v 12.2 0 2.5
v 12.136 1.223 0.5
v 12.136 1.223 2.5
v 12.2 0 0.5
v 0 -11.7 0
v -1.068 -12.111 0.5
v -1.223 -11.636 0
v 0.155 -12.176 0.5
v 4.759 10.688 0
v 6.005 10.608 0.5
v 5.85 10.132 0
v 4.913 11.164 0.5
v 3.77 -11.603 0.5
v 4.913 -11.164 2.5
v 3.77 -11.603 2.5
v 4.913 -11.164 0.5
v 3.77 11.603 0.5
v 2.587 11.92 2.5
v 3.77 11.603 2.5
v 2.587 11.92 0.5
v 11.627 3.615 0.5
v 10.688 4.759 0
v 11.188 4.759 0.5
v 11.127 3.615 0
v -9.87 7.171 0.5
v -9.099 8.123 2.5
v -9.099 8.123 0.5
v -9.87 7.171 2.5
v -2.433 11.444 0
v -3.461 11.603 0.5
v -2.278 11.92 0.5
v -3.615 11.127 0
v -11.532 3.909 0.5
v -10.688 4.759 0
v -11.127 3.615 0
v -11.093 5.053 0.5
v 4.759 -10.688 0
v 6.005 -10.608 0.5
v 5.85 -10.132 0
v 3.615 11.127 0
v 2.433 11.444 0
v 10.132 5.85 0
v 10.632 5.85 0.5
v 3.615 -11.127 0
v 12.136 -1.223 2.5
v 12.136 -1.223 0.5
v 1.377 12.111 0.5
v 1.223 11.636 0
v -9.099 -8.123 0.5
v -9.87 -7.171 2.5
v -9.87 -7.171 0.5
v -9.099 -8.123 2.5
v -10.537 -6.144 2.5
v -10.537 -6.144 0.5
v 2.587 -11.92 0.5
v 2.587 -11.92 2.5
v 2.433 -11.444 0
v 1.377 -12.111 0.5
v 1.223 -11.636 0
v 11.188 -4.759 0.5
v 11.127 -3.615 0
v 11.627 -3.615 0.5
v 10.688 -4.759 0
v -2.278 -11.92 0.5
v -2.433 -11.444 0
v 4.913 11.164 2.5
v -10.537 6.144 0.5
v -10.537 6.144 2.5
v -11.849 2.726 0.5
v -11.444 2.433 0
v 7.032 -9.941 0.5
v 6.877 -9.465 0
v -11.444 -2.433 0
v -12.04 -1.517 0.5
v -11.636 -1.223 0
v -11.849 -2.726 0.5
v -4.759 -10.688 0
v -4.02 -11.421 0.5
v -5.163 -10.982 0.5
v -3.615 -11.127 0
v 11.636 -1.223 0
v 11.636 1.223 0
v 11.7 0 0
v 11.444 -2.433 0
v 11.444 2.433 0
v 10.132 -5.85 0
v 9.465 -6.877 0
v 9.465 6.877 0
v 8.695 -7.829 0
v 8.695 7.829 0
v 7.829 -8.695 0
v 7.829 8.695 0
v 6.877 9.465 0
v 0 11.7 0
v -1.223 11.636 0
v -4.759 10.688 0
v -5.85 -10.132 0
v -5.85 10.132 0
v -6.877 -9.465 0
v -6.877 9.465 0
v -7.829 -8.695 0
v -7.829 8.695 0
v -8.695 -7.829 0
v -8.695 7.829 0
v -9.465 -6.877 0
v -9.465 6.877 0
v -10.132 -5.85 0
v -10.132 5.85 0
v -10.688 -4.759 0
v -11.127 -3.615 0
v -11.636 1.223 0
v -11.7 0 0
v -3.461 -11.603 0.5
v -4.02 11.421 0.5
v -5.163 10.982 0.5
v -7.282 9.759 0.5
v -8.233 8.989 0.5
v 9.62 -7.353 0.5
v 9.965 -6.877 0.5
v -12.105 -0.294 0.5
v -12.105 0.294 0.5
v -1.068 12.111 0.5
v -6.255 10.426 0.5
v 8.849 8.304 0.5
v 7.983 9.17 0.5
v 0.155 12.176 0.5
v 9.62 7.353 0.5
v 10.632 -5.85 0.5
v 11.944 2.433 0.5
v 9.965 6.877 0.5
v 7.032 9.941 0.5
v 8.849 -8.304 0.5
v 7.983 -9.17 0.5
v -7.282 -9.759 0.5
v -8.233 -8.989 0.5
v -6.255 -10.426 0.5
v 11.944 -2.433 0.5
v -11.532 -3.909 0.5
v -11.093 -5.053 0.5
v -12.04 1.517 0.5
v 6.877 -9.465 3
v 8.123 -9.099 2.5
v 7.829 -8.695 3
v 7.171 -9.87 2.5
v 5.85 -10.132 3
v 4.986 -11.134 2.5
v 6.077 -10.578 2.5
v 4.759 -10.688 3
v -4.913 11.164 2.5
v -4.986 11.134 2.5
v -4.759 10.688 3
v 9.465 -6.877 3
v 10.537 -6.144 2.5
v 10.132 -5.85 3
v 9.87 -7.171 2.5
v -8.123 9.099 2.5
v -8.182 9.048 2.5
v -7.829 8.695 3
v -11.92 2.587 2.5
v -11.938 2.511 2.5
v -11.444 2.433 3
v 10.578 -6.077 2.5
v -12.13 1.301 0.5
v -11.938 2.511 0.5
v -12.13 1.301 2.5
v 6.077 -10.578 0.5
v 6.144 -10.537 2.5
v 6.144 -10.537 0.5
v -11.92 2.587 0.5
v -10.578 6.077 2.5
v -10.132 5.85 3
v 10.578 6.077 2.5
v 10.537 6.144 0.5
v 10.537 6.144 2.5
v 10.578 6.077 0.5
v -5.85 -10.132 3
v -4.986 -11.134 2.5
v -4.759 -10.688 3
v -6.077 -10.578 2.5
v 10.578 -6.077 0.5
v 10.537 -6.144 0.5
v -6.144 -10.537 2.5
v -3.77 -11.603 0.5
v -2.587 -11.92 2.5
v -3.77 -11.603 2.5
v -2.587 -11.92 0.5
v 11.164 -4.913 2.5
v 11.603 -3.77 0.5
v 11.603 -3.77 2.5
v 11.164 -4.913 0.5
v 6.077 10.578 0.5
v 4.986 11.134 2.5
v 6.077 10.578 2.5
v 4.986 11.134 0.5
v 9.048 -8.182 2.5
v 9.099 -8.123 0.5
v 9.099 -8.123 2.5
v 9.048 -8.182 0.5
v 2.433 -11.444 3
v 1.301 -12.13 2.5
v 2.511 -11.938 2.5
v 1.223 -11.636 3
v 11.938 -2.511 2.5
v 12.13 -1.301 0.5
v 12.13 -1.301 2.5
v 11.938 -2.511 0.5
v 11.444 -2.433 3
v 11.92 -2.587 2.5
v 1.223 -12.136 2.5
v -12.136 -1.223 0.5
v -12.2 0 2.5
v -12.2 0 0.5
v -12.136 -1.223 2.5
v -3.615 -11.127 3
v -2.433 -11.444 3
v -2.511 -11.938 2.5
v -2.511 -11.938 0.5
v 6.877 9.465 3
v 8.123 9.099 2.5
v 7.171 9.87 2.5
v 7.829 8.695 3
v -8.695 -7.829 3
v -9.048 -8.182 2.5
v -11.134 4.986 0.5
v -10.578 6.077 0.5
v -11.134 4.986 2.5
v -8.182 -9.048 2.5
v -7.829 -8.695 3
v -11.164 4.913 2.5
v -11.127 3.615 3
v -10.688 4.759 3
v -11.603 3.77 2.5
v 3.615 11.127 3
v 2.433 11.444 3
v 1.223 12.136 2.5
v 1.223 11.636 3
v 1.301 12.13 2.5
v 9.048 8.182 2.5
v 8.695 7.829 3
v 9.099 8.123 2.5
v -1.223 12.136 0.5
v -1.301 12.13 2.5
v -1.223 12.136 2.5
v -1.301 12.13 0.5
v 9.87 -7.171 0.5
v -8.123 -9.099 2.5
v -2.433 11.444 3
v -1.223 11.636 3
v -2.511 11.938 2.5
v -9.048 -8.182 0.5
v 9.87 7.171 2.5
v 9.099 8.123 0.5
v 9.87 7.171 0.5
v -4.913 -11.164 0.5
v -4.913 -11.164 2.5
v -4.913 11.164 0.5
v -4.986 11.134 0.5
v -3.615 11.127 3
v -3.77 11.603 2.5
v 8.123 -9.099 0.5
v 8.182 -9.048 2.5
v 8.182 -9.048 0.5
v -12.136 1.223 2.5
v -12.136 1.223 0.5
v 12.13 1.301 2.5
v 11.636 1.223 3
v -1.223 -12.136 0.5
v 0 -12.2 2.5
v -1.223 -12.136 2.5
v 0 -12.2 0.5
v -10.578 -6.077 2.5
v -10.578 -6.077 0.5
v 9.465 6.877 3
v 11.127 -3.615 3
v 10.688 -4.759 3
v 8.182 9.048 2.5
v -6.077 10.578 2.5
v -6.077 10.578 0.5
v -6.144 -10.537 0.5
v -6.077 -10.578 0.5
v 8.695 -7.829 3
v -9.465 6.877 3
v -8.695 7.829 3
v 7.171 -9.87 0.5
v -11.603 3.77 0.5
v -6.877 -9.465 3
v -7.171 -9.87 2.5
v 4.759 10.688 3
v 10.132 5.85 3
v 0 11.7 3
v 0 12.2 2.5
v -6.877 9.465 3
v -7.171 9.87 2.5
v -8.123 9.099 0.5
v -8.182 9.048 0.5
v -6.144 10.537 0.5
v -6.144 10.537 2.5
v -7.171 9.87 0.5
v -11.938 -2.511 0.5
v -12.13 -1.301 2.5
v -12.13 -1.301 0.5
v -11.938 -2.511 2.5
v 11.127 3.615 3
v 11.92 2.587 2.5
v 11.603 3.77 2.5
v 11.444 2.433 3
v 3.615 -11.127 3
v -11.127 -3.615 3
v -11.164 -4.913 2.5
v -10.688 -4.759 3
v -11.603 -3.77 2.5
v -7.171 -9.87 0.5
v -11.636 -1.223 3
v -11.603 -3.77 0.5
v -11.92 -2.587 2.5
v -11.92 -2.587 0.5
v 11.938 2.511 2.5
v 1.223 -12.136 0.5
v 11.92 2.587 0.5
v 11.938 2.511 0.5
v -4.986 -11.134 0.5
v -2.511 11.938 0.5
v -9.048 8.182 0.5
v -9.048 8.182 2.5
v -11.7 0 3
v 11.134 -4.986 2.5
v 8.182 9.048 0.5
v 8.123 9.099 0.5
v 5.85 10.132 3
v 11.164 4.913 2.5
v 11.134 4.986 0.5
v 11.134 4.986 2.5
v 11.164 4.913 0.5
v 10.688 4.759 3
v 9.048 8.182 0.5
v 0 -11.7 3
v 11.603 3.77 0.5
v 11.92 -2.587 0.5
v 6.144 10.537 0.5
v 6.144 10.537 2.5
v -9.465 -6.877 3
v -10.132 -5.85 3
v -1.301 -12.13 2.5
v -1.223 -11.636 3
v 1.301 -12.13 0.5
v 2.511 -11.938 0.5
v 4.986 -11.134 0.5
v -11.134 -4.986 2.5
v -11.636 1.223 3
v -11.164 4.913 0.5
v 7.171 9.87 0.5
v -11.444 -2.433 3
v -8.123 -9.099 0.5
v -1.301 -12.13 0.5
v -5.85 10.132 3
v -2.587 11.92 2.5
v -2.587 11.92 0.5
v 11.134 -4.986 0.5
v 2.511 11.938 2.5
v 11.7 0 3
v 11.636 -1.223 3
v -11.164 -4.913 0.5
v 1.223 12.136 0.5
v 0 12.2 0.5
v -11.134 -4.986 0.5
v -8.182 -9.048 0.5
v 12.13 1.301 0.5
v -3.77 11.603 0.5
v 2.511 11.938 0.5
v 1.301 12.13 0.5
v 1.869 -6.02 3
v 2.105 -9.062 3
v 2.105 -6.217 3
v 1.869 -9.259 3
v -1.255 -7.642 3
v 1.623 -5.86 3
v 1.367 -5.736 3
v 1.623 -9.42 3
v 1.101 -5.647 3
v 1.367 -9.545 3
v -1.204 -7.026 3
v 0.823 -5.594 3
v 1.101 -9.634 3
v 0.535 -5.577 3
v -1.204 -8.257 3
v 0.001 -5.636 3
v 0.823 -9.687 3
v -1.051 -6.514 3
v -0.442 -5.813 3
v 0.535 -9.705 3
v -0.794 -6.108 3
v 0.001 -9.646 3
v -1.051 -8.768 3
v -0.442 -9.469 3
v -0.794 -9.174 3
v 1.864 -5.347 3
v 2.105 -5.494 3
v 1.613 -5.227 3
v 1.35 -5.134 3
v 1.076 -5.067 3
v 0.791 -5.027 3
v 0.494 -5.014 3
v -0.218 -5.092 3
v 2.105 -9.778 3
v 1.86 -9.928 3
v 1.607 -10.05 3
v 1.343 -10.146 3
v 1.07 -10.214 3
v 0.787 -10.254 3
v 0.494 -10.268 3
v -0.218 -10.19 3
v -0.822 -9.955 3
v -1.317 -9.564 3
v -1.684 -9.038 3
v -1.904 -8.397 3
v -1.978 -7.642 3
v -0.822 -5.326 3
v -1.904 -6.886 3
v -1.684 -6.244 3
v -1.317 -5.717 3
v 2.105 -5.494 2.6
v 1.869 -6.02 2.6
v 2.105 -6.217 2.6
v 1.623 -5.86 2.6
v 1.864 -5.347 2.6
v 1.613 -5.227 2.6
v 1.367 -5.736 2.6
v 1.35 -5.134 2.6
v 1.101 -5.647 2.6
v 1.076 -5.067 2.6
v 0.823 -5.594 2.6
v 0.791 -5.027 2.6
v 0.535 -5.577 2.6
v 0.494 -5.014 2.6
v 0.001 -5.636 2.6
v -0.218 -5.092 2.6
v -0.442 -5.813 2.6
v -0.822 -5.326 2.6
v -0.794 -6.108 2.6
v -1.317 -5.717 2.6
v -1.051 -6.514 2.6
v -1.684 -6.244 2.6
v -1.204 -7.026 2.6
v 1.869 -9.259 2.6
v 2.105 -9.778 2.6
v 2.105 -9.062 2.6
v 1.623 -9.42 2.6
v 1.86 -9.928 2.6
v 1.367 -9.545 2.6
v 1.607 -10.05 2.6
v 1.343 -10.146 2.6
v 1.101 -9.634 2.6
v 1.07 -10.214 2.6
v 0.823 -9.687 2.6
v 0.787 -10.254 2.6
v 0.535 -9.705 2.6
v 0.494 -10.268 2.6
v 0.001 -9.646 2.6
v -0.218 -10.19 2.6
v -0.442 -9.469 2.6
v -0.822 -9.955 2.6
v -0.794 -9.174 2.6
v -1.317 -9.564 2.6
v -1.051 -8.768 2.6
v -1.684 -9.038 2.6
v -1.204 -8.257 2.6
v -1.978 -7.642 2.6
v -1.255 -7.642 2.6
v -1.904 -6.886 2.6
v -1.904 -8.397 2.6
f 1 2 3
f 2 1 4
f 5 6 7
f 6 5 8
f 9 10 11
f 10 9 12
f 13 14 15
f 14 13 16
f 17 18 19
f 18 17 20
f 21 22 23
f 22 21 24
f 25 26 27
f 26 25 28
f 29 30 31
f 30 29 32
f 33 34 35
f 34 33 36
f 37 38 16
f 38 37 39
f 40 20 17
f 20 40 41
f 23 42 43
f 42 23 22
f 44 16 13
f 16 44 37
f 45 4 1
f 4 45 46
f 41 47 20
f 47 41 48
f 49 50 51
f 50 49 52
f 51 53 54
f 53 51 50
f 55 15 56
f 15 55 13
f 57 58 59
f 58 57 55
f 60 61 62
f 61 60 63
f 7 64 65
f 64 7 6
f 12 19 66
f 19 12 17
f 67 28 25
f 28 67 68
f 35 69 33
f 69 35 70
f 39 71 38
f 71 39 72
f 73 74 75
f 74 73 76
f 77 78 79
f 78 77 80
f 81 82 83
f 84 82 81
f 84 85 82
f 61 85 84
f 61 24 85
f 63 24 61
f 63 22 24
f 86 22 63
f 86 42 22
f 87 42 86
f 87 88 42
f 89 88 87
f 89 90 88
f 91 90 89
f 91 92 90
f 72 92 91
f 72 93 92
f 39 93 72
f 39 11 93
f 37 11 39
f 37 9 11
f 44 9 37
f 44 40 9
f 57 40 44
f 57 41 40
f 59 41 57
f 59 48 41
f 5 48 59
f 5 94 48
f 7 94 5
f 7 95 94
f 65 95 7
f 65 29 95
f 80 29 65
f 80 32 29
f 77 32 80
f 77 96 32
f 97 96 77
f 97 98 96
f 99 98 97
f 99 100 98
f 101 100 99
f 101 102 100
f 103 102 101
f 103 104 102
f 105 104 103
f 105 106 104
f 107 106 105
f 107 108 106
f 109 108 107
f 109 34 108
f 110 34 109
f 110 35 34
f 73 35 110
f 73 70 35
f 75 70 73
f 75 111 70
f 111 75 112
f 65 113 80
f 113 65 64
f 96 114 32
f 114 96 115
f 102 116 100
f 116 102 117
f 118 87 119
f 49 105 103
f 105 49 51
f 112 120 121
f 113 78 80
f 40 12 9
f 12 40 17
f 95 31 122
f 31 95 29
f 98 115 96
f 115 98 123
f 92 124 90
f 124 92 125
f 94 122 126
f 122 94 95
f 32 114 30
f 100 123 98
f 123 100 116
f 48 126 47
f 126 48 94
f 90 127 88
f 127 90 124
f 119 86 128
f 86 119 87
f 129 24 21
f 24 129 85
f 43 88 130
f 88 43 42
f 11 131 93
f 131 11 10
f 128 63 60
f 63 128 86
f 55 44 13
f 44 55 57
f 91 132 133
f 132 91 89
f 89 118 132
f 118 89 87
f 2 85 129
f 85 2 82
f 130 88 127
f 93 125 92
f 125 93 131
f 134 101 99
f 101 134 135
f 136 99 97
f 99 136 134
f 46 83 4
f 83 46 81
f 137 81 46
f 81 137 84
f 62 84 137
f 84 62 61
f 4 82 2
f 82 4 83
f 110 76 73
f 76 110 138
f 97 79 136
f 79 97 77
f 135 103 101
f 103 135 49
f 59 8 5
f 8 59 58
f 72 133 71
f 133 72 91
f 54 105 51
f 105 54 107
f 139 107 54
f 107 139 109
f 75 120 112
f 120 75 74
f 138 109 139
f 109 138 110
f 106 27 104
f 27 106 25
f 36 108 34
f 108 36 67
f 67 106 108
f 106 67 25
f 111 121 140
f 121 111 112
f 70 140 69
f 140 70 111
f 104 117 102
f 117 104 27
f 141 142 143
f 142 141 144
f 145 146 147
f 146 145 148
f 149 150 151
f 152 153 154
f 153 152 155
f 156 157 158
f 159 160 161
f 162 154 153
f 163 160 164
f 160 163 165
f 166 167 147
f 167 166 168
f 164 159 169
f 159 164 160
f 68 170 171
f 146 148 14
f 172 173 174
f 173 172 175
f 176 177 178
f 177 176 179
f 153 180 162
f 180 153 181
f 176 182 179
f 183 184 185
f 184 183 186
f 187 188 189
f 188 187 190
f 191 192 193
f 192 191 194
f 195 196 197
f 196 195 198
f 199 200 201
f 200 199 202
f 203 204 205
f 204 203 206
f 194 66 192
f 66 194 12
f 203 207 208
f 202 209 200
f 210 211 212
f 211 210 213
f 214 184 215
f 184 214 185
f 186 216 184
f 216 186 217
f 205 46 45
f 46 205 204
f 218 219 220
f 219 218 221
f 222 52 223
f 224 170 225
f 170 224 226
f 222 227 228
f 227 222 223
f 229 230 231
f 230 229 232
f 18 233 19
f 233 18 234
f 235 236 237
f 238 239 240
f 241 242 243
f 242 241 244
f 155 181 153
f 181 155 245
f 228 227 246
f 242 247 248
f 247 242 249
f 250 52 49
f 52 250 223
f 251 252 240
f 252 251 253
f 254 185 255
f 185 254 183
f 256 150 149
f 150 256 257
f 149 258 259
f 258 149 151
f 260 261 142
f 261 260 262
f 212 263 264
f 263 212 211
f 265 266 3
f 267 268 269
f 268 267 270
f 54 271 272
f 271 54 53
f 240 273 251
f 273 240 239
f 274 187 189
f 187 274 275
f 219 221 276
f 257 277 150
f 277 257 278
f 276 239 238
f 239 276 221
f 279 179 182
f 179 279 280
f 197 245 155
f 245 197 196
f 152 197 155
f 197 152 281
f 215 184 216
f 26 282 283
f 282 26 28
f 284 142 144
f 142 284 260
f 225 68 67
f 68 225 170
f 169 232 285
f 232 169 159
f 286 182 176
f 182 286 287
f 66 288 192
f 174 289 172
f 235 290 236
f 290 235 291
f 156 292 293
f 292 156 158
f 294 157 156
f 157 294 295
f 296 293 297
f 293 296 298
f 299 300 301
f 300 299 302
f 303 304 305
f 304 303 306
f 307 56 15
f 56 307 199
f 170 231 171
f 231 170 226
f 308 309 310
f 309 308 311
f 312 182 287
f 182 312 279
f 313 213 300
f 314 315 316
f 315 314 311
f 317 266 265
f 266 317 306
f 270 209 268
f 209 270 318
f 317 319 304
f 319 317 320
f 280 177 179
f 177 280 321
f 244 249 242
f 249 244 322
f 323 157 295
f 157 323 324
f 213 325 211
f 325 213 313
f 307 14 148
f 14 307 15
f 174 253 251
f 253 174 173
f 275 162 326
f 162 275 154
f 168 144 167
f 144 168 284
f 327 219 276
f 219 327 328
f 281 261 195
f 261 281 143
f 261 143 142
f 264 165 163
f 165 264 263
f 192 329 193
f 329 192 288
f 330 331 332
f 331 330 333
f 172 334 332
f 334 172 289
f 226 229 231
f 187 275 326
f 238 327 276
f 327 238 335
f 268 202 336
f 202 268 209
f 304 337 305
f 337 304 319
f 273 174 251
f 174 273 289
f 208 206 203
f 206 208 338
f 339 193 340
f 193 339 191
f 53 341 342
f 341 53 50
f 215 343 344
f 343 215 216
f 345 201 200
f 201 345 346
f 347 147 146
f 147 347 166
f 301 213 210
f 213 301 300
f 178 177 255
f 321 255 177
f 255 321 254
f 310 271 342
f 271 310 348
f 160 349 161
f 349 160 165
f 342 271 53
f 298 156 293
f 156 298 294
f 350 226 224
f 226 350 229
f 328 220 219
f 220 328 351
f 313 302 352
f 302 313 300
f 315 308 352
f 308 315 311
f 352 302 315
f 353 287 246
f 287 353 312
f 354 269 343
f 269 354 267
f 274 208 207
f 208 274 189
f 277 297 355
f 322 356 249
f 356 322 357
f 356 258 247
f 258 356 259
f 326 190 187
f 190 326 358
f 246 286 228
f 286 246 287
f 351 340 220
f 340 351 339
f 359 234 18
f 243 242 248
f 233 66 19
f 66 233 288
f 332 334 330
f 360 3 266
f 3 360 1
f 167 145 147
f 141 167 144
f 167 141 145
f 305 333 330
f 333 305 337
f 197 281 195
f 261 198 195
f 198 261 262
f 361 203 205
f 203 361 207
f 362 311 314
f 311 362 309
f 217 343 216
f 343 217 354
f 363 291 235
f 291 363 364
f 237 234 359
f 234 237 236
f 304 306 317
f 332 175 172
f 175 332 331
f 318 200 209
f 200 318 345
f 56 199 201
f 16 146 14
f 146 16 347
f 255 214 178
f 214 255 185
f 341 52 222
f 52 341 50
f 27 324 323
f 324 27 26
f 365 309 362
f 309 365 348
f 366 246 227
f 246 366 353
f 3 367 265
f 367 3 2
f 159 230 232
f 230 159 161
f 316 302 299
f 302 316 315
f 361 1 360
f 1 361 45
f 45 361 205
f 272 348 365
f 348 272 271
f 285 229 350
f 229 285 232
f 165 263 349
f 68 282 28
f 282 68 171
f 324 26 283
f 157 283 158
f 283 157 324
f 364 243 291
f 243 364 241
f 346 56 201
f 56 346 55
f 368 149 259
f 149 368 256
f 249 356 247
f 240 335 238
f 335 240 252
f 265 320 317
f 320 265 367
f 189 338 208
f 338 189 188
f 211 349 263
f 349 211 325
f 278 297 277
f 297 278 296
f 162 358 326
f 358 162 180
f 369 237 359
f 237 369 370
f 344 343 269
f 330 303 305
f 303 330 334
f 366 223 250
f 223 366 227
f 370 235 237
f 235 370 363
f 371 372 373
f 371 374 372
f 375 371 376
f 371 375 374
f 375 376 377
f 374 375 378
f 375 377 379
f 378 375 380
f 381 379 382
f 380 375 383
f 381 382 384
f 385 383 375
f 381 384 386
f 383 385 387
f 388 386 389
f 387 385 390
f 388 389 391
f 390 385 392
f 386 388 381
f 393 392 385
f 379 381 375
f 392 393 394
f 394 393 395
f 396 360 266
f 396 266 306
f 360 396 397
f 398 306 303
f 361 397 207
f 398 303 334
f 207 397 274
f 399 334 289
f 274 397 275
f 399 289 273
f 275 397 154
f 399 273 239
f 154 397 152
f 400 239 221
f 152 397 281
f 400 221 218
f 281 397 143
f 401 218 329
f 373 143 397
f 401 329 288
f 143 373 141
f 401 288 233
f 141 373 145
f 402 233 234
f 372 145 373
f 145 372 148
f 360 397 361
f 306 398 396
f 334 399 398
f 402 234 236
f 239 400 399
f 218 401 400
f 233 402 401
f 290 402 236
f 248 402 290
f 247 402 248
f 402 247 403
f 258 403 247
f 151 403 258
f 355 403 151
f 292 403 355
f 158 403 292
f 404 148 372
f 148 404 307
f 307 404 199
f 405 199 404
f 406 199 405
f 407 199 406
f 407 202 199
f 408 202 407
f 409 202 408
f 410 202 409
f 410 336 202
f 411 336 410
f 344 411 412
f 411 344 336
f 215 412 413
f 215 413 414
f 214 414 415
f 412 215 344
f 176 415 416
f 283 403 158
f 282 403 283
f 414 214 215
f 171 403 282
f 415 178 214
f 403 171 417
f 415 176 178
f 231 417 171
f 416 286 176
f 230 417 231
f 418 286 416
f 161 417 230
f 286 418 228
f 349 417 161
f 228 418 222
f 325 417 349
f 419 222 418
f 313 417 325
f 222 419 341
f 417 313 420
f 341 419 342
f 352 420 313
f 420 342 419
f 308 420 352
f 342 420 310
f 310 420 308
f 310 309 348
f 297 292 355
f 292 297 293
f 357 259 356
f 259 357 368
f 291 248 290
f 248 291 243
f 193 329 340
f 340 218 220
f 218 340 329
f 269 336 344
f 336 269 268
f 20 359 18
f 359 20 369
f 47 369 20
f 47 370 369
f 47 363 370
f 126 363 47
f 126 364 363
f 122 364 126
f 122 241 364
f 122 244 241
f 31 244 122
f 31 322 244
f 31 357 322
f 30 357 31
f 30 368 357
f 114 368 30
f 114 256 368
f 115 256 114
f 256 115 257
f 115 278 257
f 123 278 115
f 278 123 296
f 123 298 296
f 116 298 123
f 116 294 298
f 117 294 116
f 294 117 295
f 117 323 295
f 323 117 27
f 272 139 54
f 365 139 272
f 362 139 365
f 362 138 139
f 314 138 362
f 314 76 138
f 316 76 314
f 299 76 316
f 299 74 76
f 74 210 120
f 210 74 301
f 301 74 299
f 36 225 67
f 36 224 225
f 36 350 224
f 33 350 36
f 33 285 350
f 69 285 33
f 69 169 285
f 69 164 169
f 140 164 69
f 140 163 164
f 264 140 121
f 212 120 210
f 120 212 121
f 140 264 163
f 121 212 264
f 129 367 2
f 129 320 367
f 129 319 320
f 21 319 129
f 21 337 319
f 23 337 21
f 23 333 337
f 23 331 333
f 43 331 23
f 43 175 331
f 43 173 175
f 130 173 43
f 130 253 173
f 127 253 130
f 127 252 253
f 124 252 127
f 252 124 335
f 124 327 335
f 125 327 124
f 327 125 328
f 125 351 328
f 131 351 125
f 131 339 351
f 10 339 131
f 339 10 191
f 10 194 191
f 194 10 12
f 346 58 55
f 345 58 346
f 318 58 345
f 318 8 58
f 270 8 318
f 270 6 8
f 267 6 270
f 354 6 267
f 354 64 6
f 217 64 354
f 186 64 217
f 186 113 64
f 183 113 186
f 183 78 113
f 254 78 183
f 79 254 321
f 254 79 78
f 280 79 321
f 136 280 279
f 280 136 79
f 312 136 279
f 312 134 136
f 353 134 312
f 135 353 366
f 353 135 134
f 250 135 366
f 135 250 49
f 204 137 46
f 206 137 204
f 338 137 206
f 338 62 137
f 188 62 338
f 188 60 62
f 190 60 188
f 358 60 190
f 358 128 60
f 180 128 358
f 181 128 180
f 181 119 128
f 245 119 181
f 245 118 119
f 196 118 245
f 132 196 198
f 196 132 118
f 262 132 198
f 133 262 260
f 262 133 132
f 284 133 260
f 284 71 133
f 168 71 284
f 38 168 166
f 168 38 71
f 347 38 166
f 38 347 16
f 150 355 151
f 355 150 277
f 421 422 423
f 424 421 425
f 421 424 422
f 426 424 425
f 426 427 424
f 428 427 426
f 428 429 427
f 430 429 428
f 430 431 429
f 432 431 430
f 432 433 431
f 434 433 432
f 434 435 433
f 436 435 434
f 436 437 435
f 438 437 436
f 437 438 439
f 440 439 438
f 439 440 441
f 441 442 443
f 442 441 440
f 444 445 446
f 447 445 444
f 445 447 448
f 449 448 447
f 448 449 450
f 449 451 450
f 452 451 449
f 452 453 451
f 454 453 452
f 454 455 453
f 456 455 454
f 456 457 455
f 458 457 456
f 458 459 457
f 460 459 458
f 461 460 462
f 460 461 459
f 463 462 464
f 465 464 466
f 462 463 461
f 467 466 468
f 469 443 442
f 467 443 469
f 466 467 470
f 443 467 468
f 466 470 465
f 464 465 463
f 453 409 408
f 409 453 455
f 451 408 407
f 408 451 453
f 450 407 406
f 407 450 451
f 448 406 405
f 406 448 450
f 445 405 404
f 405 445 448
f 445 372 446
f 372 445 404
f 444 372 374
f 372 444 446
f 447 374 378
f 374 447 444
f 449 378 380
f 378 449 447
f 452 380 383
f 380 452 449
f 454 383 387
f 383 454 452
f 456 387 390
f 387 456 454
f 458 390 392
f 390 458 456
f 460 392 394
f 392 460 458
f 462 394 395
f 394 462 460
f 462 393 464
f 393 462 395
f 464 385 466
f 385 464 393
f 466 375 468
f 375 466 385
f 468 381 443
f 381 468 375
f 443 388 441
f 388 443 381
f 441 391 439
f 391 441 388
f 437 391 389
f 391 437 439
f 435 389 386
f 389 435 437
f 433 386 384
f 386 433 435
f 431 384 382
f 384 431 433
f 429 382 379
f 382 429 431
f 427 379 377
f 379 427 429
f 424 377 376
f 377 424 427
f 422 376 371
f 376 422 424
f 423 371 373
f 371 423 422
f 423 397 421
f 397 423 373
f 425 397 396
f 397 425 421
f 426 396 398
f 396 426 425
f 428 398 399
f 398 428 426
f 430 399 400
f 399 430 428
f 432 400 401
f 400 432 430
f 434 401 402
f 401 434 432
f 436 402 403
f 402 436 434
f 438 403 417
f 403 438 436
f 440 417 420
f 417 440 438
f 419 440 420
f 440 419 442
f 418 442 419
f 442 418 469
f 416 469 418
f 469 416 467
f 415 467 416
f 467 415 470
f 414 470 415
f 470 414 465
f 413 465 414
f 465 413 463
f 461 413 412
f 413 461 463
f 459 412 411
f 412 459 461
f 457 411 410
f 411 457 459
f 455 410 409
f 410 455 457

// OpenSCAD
diameter = 25.4;
label = "C";

text_offset_from_edge = 5;
text_depth = 0.4;
text_size = 5;
height = 3.0;
bevel = 0.5;
font = "Arial Rounded MT Bold";

module simple_base(radius=25.4/2) {
    translate([0,0,bevel]) minkowski() {
        cylinder(h=(height-2*bevel), r=radius-2*bevel, $fn=60);
        union() {
            cylinder(h=bevel, r1=bevel,r2=0, $fn=40);
            translate([0,0,-bevel]) cylinder(h=bevel, r2=bevel, r1=0);
        }
    }
}


module base(radius = 25.4/2, label) {
    difference() {
        simple_base(radius=radius);
        translate([0,-radius+text_offset_from_edge,height-text_depth]) 
            linear_extrude(1) 
                text(label, halign="center", valign="center", size=text_size, font=font);
    }
}

base(label=label, radius=diameter/2);
